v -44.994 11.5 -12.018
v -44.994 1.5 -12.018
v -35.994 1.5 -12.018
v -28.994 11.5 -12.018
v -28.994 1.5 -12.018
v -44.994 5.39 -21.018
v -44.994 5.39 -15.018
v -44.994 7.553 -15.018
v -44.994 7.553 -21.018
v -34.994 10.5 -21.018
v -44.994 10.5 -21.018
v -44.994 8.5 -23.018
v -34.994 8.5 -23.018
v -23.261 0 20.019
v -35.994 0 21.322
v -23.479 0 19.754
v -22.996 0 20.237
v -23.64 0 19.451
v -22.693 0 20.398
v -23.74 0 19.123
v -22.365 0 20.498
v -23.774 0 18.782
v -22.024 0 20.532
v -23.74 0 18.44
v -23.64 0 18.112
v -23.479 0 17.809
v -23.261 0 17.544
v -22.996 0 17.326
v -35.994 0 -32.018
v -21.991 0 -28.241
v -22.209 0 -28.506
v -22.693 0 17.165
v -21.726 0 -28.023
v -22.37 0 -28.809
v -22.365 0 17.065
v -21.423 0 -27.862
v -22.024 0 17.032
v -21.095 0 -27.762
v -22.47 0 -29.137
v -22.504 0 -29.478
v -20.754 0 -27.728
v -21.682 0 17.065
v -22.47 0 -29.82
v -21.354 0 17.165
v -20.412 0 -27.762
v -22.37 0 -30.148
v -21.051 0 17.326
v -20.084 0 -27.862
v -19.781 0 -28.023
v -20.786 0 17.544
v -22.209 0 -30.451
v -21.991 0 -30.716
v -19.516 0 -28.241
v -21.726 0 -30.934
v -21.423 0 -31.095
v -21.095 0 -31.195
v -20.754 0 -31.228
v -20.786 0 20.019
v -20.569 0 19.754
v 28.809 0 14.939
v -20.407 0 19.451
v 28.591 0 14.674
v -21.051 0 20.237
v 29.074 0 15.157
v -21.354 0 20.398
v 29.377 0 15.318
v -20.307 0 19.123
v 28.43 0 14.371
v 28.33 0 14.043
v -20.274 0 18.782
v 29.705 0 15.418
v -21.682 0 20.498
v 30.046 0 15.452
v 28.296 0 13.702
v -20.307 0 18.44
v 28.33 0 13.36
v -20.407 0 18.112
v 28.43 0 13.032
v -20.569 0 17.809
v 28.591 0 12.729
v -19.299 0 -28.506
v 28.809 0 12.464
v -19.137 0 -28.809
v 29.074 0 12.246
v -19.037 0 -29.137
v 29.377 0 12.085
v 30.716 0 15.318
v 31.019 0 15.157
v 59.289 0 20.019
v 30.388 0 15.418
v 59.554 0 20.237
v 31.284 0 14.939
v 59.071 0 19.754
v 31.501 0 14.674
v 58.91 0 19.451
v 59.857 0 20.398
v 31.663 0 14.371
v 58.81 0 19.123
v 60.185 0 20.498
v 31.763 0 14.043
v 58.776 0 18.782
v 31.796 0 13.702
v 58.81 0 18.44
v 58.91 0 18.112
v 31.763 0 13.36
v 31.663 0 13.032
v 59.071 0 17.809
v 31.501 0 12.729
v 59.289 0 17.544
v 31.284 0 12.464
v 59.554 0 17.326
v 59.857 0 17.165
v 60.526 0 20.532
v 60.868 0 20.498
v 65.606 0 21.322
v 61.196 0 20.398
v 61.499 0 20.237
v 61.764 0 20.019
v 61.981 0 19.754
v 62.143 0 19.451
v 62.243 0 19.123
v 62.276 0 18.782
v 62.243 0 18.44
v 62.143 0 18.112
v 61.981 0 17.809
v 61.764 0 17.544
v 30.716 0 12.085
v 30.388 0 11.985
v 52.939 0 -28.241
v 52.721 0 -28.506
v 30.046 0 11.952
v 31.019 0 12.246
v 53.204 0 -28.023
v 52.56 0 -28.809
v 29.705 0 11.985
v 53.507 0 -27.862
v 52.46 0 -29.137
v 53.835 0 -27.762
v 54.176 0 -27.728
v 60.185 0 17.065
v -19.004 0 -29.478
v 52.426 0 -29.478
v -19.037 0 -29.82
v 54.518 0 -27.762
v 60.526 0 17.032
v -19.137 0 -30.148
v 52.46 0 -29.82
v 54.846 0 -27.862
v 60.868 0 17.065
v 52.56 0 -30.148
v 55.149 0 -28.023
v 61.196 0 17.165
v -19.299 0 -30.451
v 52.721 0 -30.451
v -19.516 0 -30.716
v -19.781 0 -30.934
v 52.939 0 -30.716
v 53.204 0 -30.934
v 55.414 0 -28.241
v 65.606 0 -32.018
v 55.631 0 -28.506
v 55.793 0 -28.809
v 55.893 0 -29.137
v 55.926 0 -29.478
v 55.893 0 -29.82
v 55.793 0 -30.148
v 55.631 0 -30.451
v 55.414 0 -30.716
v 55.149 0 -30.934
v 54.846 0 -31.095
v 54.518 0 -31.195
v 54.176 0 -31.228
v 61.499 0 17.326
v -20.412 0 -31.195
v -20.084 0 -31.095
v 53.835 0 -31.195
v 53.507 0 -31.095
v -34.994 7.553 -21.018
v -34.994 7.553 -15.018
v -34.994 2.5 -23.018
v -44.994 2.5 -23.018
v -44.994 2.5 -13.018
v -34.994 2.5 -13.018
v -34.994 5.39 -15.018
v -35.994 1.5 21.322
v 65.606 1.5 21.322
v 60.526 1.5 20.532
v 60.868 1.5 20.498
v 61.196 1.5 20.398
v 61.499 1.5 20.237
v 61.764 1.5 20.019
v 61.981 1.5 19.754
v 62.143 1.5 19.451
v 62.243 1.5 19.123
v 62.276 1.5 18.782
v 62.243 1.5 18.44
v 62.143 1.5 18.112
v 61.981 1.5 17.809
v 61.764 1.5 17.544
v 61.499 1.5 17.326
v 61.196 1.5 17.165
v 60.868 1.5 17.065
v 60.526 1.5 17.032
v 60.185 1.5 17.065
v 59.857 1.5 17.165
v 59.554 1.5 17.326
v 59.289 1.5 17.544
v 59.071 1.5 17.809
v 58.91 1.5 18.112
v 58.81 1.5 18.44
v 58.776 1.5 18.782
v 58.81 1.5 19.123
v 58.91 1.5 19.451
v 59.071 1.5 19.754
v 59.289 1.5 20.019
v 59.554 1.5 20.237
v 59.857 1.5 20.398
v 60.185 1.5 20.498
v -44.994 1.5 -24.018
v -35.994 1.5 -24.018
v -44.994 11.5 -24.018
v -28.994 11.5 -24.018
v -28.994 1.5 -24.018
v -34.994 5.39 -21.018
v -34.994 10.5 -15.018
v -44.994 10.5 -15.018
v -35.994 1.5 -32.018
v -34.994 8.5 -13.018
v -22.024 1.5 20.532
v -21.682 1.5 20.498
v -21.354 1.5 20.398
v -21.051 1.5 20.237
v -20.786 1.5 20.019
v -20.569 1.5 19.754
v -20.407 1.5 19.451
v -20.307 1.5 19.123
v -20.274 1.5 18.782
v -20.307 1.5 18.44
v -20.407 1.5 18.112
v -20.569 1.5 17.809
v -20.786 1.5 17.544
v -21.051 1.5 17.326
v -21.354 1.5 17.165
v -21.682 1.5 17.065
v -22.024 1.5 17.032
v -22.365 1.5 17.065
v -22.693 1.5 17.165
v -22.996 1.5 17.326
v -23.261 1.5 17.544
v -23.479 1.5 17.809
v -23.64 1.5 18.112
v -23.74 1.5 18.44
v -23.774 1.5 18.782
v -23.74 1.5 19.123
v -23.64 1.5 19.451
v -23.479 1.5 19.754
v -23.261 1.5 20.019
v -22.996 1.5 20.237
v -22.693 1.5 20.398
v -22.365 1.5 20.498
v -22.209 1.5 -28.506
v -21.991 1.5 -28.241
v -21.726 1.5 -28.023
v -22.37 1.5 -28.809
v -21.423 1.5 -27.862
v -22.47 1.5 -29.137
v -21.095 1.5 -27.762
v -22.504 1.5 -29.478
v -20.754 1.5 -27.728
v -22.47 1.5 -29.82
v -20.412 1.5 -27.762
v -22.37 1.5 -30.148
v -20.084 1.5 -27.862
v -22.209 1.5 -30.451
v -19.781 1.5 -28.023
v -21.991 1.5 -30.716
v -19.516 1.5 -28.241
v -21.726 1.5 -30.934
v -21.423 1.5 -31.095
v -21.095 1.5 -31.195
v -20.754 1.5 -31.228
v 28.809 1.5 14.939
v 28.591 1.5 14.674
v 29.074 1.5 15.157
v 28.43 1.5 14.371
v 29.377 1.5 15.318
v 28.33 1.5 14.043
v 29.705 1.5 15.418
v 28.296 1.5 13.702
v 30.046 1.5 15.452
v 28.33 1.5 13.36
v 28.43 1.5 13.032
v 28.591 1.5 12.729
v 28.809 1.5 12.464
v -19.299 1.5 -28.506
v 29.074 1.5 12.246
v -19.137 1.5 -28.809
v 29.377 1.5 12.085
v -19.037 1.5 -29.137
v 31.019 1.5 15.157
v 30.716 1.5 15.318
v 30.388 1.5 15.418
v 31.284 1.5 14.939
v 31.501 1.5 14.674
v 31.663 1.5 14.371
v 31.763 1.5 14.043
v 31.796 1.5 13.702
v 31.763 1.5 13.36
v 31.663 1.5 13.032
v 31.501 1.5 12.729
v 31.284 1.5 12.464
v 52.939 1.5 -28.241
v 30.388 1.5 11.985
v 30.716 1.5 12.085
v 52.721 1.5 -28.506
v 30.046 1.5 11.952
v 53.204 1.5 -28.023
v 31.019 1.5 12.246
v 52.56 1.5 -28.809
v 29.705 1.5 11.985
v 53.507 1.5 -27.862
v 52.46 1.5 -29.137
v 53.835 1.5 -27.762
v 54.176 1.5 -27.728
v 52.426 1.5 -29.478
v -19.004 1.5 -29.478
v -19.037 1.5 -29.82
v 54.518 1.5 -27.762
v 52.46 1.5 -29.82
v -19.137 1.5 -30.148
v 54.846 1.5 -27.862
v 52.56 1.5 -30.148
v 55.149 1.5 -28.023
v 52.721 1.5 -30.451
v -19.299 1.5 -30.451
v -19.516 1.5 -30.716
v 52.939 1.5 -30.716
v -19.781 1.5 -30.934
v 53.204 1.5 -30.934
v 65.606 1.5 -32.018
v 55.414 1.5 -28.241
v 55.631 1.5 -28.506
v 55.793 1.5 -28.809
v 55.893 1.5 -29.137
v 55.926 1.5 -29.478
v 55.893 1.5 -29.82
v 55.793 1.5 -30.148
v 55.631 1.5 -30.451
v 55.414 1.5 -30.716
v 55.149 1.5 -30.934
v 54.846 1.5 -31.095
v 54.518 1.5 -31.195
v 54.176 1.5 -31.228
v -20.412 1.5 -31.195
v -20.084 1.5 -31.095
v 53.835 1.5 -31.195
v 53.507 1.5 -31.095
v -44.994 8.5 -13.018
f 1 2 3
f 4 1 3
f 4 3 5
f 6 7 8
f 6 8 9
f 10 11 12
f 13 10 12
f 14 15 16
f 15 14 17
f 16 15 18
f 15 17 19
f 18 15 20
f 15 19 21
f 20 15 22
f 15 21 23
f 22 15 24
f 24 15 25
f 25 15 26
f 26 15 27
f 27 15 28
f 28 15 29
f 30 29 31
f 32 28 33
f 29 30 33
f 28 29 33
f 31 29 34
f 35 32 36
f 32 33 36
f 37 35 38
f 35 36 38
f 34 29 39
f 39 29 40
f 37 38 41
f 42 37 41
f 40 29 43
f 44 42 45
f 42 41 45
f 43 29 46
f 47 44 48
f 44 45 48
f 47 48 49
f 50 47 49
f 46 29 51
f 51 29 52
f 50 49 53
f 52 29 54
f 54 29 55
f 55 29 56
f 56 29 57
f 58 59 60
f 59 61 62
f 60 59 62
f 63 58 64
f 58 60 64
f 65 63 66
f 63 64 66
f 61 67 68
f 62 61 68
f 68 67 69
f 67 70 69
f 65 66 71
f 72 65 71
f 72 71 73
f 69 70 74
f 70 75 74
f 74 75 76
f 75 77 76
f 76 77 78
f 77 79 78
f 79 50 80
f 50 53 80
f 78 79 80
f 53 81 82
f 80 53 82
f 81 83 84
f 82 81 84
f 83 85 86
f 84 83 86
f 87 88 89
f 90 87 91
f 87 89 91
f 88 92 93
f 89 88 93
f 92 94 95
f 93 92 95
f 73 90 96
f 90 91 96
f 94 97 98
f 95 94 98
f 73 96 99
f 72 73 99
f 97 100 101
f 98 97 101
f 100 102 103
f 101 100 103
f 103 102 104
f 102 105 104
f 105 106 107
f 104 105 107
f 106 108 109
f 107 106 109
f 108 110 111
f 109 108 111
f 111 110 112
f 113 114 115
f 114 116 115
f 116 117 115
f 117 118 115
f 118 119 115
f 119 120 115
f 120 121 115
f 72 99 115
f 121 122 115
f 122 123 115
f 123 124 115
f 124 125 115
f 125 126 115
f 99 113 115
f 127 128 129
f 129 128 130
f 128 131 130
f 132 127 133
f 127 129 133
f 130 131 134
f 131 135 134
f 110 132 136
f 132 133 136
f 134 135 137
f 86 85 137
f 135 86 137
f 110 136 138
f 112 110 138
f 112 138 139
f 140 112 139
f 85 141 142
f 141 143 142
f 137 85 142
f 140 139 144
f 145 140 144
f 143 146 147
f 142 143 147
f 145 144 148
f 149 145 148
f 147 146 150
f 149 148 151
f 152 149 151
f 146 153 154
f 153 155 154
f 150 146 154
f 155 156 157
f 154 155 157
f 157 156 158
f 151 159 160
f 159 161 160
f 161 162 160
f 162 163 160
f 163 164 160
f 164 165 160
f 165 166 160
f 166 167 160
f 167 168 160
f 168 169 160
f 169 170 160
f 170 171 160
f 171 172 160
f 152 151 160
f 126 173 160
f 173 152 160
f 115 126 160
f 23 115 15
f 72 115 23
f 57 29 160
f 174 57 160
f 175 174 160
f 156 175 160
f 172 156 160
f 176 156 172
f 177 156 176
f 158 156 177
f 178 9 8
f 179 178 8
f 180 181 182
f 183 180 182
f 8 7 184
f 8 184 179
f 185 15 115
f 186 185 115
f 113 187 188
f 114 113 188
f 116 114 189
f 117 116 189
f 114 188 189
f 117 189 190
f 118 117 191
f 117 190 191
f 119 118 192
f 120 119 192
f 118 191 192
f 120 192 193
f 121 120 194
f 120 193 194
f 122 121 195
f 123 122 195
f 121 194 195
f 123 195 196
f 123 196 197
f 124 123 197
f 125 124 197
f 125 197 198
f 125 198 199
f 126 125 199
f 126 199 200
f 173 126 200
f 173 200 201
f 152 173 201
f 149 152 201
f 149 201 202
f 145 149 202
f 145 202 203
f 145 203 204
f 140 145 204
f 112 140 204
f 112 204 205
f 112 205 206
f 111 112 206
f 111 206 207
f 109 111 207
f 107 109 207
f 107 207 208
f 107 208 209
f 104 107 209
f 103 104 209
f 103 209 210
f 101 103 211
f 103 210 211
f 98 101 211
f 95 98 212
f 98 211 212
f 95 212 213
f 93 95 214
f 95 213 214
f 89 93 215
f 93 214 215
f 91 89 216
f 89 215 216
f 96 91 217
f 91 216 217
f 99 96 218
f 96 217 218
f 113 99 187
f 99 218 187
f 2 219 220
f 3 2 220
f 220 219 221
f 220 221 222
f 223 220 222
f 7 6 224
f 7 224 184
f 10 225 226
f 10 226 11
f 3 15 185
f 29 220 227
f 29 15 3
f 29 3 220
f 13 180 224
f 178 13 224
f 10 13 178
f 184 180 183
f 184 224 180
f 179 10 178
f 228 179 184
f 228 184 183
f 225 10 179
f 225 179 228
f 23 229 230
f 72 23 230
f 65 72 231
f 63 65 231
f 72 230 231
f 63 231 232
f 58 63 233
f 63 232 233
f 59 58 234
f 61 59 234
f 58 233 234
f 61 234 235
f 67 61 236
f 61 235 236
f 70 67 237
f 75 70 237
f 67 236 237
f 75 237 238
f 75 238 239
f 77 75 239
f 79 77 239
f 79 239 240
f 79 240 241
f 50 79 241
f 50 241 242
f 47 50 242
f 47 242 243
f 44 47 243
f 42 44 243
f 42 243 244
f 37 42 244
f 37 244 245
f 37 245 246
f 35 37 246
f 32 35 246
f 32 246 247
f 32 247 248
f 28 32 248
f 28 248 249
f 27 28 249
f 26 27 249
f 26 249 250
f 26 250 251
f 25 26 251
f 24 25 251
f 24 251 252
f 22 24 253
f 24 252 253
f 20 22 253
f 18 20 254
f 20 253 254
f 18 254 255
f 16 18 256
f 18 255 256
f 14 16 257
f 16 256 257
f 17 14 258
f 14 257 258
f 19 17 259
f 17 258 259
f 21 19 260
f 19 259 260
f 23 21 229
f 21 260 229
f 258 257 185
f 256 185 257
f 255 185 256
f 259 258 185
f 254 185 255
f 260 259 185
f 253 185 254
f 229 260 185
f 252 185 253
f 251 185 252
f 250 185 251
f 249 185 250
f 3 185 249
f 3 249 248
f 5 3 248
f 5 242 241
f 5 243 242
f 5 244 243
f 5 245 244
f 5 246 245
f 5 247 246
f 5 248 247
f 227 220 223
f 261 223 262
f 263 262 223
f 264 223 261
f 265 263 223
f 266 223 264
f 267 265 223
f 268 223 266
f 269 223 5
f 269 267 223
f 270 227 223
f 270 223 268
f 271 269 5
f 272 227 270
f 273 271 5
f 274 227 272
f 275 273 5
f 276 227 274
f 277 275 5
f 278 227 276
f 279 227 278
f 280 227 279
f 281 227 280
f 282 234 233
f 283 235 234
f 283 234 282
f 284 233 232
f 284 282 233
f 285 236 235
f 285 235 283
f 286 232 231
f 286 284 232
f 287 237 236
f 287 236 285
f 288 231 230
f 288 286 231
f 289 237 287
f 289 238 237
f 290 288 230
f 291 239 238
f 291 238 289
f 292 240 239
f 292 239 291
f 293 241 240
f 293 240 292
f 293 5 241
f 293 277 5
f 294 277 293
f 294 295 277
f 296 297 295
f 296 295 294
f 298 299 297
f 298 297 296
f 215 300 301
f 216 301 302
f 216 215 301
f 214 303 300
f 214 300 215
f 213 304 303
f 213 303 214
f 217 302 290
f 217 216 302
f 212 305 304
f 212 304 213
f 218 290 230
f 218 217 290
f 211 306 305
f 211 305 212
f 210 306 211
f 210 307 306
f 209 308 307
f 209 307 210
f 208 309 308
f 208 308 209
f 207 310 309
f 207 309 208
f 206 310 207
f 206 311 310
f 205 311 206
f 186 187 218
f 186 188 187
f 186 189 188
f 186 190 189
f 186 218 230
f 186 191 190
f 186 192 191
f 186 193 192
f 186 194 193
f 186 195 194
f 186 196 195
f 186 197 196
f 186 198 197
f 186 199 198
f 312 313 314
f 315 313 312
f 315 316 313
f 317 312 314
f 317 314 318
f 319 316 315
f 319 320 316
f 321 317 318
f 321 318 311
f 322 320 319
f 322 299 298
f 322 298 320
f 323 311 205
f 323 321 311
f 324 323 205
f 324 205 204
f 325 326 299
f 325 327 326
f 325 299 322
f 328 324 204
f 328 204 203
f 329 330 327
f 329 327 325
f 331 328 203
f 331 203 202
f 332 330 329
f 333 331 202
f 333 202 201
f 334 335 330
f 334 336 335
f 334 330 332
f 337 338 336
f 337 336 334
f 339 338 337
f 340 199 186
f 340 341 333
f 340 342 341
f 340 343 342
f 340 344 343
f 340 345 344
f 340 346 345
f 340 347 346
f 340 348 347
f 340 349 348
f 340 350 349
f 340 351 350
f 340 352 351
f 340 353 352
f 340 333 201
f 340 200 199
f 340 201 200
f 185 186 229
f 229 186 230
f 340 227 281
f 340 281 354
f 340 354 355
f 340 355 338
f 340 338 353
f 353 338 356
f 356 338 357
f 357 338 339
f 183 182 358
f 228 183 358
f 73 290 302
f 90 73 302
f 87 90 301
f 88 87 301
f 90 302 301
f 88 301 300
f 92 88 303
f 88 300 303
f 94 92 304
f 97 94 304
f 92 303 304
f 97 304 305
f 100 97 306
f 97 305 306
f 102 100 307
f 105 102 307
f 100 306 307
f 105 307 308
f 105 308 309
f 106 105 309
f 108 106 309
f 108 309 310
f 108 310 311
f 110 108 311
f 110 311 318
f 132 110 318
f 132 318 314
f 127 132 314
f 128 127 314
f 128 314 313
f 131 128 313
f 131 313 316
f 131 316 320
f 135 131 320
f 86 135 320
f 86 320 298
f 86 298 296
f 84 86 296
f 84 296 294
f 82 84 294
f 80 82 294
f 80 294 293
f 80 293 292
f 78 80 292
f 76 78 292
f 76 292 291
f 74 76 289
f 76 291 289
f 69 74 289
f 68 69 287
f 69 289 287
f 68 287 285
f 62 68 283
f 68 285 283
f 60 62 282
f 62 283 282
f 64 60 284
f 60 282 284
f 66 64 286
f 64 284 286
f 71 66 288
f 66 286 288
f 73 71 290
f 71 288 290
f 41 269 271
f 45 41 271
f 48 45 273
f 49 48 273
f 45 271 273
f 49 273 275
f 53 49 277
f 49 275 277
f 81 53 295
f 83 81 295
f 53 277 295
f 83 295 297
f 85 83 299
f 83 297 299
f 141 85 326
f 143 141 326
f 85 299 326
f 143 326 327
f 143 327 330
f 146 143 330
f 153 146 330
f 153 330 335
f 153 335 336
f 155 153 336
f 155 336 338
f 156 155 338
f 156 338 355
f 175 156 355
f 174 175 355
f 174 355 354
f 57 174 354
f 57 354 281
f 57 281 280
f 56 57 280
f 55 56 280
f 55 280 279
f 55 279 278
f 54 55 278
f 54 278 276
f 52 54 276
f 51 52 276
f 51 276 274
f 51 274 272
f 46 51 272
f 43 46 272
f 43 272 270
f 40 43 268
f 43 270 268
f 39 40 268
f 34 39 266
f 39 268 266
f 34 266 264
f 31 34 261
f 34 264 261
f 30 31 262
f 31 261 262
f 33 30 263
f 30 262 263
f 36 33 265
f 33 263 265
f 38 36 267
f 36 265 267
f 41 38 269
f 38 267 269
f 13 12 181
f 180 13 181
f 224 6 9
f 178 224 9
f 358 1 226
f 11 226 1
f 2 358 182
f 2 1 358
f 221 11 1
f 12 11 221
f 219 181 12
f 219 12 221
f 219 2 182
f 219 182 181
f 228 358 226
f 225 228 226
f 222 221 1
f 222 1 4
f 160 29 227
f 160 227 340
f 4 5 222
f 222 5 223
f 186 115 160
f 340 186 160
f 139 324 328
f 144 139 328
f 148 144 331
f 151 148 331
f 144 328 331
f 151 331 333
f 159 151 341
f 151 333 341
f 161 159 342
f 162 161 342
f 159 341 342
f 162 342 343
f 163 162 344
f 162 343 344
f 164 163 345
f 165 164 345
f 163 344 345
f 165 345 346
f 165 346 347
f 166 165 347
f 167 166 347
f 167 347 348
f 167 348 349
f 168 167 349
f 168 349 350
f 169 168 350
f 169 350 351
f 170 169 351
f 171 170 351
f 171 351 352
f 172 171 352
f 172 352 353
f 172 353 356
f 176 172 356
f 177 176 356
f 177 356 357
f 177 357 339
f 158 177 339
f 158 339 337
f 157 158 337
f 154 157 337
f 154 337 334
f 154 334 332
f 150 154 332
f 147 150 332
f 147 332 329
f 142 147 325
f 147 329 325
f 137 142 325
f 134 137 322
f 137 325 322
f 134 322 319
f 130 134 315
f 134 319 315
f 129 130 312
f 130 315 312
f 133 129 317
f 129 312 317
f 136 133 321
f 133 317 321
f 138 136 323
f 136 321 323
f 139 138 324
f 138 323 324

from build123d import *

# Parameters (mm, degrees)
SKETCH_1_W          = 101.6
SKETCH_1_H          = 53.34
EXTRUDE_1_DEPTH     = 1.5
SKETCH_2_W          = 16
SKETCH_2_H          = 12
EXTRUDE_2_DEPTH     = 10
SKETCH_3_W          = 6
SKETCH_3_H          = 2.163495019
CUT_EXTRUDE_1_DEPTH = 10
SKETCH_6_R          = 1.75
CUT_EXTRUDE_2_DEPTH = 74.684282714


with BuildPart() as part:
    # 草图1 → 凸台-拉伸1 (new body)
    with BuildSketch(Plane(origin=(0, 0, 0), x_dir=(1, 0, 0), z_dir=(0, 1, 0))):
        with Locations((14.806341463, 5.348455285)):
            Rectangle(SKETCH_1_W, SKETCH_1_H)
    extrude(amount=EXTRUDE_1_DEPTH)

    # 草图2 → 凸台-拉伸2 (add)
    with BuildSketch(Plane(origin=(0, 1.5, 0), x_dir=(1, 0, 0), z_dir=(0, 1, 0))):
        with Locations((-36.993658537, 18.018455285)):
            Rectangle(SKETCH_2_W, SKETCH_2_H)
    extrude(amount=EXTRUDE_2_DEPTH)

    # 草图3 → 切除-拉伸1 (cut)
    with BuildSketch(Plane.ZY.offset(44.993658537)):
        Polygon((-21.018455285, 10.5), (-23.018455285, 8.5), (-23.018455285, 2.5), (-13.018455285, 2.5), (-13.018455285, 8.5), (-15.018455285, 10.5), align=None)
        with Locations((-18.018455285, 6.471327075)):
            Rectangle(SKETCH_3_W, SKETCH_3_H, mode=Mode.SUBTRACT)
    extrude(amount=-CUT_EXTRUDE_1_DEPTH, mode=Mode.SUBTRACT)

    # 草图6 → 切除-拉伸2 (cut, through all)
    with BuildSketch(Plane(origin=(0, 1.5, 0), x_dir=(1, 0, 0), z_dir=(0, 1, 0))):
        with Locations(Location((-20.753658537, 29.478455285, 0), (0, 0, 270))):
            Circle(SKETCH_6_R)
        with Locations(Location((54.176341463, 29.478455285, 0), (0, 0, 270))):
            Circle(SKETCH_6_R)
        with Locations(Location((-22.023658537, -18.781544715, 0), (0, 0, 270))):
            Circle(SKETCH_6_R)
        with Locations(Location((30.046341463, -13.701544715, 0), (0, 0, 270))):
            Circle(SKETCH_6_R)
        with Locations(Location((60.526341463, -18.781544715, 0), (0, 0, 270))):
            Circle(SKETCH_6_R)
    extrude(amount=-CUT_EXTRUDE_2_DEPTH, mode=Mode.SUBTRACT)


solid = part.part
